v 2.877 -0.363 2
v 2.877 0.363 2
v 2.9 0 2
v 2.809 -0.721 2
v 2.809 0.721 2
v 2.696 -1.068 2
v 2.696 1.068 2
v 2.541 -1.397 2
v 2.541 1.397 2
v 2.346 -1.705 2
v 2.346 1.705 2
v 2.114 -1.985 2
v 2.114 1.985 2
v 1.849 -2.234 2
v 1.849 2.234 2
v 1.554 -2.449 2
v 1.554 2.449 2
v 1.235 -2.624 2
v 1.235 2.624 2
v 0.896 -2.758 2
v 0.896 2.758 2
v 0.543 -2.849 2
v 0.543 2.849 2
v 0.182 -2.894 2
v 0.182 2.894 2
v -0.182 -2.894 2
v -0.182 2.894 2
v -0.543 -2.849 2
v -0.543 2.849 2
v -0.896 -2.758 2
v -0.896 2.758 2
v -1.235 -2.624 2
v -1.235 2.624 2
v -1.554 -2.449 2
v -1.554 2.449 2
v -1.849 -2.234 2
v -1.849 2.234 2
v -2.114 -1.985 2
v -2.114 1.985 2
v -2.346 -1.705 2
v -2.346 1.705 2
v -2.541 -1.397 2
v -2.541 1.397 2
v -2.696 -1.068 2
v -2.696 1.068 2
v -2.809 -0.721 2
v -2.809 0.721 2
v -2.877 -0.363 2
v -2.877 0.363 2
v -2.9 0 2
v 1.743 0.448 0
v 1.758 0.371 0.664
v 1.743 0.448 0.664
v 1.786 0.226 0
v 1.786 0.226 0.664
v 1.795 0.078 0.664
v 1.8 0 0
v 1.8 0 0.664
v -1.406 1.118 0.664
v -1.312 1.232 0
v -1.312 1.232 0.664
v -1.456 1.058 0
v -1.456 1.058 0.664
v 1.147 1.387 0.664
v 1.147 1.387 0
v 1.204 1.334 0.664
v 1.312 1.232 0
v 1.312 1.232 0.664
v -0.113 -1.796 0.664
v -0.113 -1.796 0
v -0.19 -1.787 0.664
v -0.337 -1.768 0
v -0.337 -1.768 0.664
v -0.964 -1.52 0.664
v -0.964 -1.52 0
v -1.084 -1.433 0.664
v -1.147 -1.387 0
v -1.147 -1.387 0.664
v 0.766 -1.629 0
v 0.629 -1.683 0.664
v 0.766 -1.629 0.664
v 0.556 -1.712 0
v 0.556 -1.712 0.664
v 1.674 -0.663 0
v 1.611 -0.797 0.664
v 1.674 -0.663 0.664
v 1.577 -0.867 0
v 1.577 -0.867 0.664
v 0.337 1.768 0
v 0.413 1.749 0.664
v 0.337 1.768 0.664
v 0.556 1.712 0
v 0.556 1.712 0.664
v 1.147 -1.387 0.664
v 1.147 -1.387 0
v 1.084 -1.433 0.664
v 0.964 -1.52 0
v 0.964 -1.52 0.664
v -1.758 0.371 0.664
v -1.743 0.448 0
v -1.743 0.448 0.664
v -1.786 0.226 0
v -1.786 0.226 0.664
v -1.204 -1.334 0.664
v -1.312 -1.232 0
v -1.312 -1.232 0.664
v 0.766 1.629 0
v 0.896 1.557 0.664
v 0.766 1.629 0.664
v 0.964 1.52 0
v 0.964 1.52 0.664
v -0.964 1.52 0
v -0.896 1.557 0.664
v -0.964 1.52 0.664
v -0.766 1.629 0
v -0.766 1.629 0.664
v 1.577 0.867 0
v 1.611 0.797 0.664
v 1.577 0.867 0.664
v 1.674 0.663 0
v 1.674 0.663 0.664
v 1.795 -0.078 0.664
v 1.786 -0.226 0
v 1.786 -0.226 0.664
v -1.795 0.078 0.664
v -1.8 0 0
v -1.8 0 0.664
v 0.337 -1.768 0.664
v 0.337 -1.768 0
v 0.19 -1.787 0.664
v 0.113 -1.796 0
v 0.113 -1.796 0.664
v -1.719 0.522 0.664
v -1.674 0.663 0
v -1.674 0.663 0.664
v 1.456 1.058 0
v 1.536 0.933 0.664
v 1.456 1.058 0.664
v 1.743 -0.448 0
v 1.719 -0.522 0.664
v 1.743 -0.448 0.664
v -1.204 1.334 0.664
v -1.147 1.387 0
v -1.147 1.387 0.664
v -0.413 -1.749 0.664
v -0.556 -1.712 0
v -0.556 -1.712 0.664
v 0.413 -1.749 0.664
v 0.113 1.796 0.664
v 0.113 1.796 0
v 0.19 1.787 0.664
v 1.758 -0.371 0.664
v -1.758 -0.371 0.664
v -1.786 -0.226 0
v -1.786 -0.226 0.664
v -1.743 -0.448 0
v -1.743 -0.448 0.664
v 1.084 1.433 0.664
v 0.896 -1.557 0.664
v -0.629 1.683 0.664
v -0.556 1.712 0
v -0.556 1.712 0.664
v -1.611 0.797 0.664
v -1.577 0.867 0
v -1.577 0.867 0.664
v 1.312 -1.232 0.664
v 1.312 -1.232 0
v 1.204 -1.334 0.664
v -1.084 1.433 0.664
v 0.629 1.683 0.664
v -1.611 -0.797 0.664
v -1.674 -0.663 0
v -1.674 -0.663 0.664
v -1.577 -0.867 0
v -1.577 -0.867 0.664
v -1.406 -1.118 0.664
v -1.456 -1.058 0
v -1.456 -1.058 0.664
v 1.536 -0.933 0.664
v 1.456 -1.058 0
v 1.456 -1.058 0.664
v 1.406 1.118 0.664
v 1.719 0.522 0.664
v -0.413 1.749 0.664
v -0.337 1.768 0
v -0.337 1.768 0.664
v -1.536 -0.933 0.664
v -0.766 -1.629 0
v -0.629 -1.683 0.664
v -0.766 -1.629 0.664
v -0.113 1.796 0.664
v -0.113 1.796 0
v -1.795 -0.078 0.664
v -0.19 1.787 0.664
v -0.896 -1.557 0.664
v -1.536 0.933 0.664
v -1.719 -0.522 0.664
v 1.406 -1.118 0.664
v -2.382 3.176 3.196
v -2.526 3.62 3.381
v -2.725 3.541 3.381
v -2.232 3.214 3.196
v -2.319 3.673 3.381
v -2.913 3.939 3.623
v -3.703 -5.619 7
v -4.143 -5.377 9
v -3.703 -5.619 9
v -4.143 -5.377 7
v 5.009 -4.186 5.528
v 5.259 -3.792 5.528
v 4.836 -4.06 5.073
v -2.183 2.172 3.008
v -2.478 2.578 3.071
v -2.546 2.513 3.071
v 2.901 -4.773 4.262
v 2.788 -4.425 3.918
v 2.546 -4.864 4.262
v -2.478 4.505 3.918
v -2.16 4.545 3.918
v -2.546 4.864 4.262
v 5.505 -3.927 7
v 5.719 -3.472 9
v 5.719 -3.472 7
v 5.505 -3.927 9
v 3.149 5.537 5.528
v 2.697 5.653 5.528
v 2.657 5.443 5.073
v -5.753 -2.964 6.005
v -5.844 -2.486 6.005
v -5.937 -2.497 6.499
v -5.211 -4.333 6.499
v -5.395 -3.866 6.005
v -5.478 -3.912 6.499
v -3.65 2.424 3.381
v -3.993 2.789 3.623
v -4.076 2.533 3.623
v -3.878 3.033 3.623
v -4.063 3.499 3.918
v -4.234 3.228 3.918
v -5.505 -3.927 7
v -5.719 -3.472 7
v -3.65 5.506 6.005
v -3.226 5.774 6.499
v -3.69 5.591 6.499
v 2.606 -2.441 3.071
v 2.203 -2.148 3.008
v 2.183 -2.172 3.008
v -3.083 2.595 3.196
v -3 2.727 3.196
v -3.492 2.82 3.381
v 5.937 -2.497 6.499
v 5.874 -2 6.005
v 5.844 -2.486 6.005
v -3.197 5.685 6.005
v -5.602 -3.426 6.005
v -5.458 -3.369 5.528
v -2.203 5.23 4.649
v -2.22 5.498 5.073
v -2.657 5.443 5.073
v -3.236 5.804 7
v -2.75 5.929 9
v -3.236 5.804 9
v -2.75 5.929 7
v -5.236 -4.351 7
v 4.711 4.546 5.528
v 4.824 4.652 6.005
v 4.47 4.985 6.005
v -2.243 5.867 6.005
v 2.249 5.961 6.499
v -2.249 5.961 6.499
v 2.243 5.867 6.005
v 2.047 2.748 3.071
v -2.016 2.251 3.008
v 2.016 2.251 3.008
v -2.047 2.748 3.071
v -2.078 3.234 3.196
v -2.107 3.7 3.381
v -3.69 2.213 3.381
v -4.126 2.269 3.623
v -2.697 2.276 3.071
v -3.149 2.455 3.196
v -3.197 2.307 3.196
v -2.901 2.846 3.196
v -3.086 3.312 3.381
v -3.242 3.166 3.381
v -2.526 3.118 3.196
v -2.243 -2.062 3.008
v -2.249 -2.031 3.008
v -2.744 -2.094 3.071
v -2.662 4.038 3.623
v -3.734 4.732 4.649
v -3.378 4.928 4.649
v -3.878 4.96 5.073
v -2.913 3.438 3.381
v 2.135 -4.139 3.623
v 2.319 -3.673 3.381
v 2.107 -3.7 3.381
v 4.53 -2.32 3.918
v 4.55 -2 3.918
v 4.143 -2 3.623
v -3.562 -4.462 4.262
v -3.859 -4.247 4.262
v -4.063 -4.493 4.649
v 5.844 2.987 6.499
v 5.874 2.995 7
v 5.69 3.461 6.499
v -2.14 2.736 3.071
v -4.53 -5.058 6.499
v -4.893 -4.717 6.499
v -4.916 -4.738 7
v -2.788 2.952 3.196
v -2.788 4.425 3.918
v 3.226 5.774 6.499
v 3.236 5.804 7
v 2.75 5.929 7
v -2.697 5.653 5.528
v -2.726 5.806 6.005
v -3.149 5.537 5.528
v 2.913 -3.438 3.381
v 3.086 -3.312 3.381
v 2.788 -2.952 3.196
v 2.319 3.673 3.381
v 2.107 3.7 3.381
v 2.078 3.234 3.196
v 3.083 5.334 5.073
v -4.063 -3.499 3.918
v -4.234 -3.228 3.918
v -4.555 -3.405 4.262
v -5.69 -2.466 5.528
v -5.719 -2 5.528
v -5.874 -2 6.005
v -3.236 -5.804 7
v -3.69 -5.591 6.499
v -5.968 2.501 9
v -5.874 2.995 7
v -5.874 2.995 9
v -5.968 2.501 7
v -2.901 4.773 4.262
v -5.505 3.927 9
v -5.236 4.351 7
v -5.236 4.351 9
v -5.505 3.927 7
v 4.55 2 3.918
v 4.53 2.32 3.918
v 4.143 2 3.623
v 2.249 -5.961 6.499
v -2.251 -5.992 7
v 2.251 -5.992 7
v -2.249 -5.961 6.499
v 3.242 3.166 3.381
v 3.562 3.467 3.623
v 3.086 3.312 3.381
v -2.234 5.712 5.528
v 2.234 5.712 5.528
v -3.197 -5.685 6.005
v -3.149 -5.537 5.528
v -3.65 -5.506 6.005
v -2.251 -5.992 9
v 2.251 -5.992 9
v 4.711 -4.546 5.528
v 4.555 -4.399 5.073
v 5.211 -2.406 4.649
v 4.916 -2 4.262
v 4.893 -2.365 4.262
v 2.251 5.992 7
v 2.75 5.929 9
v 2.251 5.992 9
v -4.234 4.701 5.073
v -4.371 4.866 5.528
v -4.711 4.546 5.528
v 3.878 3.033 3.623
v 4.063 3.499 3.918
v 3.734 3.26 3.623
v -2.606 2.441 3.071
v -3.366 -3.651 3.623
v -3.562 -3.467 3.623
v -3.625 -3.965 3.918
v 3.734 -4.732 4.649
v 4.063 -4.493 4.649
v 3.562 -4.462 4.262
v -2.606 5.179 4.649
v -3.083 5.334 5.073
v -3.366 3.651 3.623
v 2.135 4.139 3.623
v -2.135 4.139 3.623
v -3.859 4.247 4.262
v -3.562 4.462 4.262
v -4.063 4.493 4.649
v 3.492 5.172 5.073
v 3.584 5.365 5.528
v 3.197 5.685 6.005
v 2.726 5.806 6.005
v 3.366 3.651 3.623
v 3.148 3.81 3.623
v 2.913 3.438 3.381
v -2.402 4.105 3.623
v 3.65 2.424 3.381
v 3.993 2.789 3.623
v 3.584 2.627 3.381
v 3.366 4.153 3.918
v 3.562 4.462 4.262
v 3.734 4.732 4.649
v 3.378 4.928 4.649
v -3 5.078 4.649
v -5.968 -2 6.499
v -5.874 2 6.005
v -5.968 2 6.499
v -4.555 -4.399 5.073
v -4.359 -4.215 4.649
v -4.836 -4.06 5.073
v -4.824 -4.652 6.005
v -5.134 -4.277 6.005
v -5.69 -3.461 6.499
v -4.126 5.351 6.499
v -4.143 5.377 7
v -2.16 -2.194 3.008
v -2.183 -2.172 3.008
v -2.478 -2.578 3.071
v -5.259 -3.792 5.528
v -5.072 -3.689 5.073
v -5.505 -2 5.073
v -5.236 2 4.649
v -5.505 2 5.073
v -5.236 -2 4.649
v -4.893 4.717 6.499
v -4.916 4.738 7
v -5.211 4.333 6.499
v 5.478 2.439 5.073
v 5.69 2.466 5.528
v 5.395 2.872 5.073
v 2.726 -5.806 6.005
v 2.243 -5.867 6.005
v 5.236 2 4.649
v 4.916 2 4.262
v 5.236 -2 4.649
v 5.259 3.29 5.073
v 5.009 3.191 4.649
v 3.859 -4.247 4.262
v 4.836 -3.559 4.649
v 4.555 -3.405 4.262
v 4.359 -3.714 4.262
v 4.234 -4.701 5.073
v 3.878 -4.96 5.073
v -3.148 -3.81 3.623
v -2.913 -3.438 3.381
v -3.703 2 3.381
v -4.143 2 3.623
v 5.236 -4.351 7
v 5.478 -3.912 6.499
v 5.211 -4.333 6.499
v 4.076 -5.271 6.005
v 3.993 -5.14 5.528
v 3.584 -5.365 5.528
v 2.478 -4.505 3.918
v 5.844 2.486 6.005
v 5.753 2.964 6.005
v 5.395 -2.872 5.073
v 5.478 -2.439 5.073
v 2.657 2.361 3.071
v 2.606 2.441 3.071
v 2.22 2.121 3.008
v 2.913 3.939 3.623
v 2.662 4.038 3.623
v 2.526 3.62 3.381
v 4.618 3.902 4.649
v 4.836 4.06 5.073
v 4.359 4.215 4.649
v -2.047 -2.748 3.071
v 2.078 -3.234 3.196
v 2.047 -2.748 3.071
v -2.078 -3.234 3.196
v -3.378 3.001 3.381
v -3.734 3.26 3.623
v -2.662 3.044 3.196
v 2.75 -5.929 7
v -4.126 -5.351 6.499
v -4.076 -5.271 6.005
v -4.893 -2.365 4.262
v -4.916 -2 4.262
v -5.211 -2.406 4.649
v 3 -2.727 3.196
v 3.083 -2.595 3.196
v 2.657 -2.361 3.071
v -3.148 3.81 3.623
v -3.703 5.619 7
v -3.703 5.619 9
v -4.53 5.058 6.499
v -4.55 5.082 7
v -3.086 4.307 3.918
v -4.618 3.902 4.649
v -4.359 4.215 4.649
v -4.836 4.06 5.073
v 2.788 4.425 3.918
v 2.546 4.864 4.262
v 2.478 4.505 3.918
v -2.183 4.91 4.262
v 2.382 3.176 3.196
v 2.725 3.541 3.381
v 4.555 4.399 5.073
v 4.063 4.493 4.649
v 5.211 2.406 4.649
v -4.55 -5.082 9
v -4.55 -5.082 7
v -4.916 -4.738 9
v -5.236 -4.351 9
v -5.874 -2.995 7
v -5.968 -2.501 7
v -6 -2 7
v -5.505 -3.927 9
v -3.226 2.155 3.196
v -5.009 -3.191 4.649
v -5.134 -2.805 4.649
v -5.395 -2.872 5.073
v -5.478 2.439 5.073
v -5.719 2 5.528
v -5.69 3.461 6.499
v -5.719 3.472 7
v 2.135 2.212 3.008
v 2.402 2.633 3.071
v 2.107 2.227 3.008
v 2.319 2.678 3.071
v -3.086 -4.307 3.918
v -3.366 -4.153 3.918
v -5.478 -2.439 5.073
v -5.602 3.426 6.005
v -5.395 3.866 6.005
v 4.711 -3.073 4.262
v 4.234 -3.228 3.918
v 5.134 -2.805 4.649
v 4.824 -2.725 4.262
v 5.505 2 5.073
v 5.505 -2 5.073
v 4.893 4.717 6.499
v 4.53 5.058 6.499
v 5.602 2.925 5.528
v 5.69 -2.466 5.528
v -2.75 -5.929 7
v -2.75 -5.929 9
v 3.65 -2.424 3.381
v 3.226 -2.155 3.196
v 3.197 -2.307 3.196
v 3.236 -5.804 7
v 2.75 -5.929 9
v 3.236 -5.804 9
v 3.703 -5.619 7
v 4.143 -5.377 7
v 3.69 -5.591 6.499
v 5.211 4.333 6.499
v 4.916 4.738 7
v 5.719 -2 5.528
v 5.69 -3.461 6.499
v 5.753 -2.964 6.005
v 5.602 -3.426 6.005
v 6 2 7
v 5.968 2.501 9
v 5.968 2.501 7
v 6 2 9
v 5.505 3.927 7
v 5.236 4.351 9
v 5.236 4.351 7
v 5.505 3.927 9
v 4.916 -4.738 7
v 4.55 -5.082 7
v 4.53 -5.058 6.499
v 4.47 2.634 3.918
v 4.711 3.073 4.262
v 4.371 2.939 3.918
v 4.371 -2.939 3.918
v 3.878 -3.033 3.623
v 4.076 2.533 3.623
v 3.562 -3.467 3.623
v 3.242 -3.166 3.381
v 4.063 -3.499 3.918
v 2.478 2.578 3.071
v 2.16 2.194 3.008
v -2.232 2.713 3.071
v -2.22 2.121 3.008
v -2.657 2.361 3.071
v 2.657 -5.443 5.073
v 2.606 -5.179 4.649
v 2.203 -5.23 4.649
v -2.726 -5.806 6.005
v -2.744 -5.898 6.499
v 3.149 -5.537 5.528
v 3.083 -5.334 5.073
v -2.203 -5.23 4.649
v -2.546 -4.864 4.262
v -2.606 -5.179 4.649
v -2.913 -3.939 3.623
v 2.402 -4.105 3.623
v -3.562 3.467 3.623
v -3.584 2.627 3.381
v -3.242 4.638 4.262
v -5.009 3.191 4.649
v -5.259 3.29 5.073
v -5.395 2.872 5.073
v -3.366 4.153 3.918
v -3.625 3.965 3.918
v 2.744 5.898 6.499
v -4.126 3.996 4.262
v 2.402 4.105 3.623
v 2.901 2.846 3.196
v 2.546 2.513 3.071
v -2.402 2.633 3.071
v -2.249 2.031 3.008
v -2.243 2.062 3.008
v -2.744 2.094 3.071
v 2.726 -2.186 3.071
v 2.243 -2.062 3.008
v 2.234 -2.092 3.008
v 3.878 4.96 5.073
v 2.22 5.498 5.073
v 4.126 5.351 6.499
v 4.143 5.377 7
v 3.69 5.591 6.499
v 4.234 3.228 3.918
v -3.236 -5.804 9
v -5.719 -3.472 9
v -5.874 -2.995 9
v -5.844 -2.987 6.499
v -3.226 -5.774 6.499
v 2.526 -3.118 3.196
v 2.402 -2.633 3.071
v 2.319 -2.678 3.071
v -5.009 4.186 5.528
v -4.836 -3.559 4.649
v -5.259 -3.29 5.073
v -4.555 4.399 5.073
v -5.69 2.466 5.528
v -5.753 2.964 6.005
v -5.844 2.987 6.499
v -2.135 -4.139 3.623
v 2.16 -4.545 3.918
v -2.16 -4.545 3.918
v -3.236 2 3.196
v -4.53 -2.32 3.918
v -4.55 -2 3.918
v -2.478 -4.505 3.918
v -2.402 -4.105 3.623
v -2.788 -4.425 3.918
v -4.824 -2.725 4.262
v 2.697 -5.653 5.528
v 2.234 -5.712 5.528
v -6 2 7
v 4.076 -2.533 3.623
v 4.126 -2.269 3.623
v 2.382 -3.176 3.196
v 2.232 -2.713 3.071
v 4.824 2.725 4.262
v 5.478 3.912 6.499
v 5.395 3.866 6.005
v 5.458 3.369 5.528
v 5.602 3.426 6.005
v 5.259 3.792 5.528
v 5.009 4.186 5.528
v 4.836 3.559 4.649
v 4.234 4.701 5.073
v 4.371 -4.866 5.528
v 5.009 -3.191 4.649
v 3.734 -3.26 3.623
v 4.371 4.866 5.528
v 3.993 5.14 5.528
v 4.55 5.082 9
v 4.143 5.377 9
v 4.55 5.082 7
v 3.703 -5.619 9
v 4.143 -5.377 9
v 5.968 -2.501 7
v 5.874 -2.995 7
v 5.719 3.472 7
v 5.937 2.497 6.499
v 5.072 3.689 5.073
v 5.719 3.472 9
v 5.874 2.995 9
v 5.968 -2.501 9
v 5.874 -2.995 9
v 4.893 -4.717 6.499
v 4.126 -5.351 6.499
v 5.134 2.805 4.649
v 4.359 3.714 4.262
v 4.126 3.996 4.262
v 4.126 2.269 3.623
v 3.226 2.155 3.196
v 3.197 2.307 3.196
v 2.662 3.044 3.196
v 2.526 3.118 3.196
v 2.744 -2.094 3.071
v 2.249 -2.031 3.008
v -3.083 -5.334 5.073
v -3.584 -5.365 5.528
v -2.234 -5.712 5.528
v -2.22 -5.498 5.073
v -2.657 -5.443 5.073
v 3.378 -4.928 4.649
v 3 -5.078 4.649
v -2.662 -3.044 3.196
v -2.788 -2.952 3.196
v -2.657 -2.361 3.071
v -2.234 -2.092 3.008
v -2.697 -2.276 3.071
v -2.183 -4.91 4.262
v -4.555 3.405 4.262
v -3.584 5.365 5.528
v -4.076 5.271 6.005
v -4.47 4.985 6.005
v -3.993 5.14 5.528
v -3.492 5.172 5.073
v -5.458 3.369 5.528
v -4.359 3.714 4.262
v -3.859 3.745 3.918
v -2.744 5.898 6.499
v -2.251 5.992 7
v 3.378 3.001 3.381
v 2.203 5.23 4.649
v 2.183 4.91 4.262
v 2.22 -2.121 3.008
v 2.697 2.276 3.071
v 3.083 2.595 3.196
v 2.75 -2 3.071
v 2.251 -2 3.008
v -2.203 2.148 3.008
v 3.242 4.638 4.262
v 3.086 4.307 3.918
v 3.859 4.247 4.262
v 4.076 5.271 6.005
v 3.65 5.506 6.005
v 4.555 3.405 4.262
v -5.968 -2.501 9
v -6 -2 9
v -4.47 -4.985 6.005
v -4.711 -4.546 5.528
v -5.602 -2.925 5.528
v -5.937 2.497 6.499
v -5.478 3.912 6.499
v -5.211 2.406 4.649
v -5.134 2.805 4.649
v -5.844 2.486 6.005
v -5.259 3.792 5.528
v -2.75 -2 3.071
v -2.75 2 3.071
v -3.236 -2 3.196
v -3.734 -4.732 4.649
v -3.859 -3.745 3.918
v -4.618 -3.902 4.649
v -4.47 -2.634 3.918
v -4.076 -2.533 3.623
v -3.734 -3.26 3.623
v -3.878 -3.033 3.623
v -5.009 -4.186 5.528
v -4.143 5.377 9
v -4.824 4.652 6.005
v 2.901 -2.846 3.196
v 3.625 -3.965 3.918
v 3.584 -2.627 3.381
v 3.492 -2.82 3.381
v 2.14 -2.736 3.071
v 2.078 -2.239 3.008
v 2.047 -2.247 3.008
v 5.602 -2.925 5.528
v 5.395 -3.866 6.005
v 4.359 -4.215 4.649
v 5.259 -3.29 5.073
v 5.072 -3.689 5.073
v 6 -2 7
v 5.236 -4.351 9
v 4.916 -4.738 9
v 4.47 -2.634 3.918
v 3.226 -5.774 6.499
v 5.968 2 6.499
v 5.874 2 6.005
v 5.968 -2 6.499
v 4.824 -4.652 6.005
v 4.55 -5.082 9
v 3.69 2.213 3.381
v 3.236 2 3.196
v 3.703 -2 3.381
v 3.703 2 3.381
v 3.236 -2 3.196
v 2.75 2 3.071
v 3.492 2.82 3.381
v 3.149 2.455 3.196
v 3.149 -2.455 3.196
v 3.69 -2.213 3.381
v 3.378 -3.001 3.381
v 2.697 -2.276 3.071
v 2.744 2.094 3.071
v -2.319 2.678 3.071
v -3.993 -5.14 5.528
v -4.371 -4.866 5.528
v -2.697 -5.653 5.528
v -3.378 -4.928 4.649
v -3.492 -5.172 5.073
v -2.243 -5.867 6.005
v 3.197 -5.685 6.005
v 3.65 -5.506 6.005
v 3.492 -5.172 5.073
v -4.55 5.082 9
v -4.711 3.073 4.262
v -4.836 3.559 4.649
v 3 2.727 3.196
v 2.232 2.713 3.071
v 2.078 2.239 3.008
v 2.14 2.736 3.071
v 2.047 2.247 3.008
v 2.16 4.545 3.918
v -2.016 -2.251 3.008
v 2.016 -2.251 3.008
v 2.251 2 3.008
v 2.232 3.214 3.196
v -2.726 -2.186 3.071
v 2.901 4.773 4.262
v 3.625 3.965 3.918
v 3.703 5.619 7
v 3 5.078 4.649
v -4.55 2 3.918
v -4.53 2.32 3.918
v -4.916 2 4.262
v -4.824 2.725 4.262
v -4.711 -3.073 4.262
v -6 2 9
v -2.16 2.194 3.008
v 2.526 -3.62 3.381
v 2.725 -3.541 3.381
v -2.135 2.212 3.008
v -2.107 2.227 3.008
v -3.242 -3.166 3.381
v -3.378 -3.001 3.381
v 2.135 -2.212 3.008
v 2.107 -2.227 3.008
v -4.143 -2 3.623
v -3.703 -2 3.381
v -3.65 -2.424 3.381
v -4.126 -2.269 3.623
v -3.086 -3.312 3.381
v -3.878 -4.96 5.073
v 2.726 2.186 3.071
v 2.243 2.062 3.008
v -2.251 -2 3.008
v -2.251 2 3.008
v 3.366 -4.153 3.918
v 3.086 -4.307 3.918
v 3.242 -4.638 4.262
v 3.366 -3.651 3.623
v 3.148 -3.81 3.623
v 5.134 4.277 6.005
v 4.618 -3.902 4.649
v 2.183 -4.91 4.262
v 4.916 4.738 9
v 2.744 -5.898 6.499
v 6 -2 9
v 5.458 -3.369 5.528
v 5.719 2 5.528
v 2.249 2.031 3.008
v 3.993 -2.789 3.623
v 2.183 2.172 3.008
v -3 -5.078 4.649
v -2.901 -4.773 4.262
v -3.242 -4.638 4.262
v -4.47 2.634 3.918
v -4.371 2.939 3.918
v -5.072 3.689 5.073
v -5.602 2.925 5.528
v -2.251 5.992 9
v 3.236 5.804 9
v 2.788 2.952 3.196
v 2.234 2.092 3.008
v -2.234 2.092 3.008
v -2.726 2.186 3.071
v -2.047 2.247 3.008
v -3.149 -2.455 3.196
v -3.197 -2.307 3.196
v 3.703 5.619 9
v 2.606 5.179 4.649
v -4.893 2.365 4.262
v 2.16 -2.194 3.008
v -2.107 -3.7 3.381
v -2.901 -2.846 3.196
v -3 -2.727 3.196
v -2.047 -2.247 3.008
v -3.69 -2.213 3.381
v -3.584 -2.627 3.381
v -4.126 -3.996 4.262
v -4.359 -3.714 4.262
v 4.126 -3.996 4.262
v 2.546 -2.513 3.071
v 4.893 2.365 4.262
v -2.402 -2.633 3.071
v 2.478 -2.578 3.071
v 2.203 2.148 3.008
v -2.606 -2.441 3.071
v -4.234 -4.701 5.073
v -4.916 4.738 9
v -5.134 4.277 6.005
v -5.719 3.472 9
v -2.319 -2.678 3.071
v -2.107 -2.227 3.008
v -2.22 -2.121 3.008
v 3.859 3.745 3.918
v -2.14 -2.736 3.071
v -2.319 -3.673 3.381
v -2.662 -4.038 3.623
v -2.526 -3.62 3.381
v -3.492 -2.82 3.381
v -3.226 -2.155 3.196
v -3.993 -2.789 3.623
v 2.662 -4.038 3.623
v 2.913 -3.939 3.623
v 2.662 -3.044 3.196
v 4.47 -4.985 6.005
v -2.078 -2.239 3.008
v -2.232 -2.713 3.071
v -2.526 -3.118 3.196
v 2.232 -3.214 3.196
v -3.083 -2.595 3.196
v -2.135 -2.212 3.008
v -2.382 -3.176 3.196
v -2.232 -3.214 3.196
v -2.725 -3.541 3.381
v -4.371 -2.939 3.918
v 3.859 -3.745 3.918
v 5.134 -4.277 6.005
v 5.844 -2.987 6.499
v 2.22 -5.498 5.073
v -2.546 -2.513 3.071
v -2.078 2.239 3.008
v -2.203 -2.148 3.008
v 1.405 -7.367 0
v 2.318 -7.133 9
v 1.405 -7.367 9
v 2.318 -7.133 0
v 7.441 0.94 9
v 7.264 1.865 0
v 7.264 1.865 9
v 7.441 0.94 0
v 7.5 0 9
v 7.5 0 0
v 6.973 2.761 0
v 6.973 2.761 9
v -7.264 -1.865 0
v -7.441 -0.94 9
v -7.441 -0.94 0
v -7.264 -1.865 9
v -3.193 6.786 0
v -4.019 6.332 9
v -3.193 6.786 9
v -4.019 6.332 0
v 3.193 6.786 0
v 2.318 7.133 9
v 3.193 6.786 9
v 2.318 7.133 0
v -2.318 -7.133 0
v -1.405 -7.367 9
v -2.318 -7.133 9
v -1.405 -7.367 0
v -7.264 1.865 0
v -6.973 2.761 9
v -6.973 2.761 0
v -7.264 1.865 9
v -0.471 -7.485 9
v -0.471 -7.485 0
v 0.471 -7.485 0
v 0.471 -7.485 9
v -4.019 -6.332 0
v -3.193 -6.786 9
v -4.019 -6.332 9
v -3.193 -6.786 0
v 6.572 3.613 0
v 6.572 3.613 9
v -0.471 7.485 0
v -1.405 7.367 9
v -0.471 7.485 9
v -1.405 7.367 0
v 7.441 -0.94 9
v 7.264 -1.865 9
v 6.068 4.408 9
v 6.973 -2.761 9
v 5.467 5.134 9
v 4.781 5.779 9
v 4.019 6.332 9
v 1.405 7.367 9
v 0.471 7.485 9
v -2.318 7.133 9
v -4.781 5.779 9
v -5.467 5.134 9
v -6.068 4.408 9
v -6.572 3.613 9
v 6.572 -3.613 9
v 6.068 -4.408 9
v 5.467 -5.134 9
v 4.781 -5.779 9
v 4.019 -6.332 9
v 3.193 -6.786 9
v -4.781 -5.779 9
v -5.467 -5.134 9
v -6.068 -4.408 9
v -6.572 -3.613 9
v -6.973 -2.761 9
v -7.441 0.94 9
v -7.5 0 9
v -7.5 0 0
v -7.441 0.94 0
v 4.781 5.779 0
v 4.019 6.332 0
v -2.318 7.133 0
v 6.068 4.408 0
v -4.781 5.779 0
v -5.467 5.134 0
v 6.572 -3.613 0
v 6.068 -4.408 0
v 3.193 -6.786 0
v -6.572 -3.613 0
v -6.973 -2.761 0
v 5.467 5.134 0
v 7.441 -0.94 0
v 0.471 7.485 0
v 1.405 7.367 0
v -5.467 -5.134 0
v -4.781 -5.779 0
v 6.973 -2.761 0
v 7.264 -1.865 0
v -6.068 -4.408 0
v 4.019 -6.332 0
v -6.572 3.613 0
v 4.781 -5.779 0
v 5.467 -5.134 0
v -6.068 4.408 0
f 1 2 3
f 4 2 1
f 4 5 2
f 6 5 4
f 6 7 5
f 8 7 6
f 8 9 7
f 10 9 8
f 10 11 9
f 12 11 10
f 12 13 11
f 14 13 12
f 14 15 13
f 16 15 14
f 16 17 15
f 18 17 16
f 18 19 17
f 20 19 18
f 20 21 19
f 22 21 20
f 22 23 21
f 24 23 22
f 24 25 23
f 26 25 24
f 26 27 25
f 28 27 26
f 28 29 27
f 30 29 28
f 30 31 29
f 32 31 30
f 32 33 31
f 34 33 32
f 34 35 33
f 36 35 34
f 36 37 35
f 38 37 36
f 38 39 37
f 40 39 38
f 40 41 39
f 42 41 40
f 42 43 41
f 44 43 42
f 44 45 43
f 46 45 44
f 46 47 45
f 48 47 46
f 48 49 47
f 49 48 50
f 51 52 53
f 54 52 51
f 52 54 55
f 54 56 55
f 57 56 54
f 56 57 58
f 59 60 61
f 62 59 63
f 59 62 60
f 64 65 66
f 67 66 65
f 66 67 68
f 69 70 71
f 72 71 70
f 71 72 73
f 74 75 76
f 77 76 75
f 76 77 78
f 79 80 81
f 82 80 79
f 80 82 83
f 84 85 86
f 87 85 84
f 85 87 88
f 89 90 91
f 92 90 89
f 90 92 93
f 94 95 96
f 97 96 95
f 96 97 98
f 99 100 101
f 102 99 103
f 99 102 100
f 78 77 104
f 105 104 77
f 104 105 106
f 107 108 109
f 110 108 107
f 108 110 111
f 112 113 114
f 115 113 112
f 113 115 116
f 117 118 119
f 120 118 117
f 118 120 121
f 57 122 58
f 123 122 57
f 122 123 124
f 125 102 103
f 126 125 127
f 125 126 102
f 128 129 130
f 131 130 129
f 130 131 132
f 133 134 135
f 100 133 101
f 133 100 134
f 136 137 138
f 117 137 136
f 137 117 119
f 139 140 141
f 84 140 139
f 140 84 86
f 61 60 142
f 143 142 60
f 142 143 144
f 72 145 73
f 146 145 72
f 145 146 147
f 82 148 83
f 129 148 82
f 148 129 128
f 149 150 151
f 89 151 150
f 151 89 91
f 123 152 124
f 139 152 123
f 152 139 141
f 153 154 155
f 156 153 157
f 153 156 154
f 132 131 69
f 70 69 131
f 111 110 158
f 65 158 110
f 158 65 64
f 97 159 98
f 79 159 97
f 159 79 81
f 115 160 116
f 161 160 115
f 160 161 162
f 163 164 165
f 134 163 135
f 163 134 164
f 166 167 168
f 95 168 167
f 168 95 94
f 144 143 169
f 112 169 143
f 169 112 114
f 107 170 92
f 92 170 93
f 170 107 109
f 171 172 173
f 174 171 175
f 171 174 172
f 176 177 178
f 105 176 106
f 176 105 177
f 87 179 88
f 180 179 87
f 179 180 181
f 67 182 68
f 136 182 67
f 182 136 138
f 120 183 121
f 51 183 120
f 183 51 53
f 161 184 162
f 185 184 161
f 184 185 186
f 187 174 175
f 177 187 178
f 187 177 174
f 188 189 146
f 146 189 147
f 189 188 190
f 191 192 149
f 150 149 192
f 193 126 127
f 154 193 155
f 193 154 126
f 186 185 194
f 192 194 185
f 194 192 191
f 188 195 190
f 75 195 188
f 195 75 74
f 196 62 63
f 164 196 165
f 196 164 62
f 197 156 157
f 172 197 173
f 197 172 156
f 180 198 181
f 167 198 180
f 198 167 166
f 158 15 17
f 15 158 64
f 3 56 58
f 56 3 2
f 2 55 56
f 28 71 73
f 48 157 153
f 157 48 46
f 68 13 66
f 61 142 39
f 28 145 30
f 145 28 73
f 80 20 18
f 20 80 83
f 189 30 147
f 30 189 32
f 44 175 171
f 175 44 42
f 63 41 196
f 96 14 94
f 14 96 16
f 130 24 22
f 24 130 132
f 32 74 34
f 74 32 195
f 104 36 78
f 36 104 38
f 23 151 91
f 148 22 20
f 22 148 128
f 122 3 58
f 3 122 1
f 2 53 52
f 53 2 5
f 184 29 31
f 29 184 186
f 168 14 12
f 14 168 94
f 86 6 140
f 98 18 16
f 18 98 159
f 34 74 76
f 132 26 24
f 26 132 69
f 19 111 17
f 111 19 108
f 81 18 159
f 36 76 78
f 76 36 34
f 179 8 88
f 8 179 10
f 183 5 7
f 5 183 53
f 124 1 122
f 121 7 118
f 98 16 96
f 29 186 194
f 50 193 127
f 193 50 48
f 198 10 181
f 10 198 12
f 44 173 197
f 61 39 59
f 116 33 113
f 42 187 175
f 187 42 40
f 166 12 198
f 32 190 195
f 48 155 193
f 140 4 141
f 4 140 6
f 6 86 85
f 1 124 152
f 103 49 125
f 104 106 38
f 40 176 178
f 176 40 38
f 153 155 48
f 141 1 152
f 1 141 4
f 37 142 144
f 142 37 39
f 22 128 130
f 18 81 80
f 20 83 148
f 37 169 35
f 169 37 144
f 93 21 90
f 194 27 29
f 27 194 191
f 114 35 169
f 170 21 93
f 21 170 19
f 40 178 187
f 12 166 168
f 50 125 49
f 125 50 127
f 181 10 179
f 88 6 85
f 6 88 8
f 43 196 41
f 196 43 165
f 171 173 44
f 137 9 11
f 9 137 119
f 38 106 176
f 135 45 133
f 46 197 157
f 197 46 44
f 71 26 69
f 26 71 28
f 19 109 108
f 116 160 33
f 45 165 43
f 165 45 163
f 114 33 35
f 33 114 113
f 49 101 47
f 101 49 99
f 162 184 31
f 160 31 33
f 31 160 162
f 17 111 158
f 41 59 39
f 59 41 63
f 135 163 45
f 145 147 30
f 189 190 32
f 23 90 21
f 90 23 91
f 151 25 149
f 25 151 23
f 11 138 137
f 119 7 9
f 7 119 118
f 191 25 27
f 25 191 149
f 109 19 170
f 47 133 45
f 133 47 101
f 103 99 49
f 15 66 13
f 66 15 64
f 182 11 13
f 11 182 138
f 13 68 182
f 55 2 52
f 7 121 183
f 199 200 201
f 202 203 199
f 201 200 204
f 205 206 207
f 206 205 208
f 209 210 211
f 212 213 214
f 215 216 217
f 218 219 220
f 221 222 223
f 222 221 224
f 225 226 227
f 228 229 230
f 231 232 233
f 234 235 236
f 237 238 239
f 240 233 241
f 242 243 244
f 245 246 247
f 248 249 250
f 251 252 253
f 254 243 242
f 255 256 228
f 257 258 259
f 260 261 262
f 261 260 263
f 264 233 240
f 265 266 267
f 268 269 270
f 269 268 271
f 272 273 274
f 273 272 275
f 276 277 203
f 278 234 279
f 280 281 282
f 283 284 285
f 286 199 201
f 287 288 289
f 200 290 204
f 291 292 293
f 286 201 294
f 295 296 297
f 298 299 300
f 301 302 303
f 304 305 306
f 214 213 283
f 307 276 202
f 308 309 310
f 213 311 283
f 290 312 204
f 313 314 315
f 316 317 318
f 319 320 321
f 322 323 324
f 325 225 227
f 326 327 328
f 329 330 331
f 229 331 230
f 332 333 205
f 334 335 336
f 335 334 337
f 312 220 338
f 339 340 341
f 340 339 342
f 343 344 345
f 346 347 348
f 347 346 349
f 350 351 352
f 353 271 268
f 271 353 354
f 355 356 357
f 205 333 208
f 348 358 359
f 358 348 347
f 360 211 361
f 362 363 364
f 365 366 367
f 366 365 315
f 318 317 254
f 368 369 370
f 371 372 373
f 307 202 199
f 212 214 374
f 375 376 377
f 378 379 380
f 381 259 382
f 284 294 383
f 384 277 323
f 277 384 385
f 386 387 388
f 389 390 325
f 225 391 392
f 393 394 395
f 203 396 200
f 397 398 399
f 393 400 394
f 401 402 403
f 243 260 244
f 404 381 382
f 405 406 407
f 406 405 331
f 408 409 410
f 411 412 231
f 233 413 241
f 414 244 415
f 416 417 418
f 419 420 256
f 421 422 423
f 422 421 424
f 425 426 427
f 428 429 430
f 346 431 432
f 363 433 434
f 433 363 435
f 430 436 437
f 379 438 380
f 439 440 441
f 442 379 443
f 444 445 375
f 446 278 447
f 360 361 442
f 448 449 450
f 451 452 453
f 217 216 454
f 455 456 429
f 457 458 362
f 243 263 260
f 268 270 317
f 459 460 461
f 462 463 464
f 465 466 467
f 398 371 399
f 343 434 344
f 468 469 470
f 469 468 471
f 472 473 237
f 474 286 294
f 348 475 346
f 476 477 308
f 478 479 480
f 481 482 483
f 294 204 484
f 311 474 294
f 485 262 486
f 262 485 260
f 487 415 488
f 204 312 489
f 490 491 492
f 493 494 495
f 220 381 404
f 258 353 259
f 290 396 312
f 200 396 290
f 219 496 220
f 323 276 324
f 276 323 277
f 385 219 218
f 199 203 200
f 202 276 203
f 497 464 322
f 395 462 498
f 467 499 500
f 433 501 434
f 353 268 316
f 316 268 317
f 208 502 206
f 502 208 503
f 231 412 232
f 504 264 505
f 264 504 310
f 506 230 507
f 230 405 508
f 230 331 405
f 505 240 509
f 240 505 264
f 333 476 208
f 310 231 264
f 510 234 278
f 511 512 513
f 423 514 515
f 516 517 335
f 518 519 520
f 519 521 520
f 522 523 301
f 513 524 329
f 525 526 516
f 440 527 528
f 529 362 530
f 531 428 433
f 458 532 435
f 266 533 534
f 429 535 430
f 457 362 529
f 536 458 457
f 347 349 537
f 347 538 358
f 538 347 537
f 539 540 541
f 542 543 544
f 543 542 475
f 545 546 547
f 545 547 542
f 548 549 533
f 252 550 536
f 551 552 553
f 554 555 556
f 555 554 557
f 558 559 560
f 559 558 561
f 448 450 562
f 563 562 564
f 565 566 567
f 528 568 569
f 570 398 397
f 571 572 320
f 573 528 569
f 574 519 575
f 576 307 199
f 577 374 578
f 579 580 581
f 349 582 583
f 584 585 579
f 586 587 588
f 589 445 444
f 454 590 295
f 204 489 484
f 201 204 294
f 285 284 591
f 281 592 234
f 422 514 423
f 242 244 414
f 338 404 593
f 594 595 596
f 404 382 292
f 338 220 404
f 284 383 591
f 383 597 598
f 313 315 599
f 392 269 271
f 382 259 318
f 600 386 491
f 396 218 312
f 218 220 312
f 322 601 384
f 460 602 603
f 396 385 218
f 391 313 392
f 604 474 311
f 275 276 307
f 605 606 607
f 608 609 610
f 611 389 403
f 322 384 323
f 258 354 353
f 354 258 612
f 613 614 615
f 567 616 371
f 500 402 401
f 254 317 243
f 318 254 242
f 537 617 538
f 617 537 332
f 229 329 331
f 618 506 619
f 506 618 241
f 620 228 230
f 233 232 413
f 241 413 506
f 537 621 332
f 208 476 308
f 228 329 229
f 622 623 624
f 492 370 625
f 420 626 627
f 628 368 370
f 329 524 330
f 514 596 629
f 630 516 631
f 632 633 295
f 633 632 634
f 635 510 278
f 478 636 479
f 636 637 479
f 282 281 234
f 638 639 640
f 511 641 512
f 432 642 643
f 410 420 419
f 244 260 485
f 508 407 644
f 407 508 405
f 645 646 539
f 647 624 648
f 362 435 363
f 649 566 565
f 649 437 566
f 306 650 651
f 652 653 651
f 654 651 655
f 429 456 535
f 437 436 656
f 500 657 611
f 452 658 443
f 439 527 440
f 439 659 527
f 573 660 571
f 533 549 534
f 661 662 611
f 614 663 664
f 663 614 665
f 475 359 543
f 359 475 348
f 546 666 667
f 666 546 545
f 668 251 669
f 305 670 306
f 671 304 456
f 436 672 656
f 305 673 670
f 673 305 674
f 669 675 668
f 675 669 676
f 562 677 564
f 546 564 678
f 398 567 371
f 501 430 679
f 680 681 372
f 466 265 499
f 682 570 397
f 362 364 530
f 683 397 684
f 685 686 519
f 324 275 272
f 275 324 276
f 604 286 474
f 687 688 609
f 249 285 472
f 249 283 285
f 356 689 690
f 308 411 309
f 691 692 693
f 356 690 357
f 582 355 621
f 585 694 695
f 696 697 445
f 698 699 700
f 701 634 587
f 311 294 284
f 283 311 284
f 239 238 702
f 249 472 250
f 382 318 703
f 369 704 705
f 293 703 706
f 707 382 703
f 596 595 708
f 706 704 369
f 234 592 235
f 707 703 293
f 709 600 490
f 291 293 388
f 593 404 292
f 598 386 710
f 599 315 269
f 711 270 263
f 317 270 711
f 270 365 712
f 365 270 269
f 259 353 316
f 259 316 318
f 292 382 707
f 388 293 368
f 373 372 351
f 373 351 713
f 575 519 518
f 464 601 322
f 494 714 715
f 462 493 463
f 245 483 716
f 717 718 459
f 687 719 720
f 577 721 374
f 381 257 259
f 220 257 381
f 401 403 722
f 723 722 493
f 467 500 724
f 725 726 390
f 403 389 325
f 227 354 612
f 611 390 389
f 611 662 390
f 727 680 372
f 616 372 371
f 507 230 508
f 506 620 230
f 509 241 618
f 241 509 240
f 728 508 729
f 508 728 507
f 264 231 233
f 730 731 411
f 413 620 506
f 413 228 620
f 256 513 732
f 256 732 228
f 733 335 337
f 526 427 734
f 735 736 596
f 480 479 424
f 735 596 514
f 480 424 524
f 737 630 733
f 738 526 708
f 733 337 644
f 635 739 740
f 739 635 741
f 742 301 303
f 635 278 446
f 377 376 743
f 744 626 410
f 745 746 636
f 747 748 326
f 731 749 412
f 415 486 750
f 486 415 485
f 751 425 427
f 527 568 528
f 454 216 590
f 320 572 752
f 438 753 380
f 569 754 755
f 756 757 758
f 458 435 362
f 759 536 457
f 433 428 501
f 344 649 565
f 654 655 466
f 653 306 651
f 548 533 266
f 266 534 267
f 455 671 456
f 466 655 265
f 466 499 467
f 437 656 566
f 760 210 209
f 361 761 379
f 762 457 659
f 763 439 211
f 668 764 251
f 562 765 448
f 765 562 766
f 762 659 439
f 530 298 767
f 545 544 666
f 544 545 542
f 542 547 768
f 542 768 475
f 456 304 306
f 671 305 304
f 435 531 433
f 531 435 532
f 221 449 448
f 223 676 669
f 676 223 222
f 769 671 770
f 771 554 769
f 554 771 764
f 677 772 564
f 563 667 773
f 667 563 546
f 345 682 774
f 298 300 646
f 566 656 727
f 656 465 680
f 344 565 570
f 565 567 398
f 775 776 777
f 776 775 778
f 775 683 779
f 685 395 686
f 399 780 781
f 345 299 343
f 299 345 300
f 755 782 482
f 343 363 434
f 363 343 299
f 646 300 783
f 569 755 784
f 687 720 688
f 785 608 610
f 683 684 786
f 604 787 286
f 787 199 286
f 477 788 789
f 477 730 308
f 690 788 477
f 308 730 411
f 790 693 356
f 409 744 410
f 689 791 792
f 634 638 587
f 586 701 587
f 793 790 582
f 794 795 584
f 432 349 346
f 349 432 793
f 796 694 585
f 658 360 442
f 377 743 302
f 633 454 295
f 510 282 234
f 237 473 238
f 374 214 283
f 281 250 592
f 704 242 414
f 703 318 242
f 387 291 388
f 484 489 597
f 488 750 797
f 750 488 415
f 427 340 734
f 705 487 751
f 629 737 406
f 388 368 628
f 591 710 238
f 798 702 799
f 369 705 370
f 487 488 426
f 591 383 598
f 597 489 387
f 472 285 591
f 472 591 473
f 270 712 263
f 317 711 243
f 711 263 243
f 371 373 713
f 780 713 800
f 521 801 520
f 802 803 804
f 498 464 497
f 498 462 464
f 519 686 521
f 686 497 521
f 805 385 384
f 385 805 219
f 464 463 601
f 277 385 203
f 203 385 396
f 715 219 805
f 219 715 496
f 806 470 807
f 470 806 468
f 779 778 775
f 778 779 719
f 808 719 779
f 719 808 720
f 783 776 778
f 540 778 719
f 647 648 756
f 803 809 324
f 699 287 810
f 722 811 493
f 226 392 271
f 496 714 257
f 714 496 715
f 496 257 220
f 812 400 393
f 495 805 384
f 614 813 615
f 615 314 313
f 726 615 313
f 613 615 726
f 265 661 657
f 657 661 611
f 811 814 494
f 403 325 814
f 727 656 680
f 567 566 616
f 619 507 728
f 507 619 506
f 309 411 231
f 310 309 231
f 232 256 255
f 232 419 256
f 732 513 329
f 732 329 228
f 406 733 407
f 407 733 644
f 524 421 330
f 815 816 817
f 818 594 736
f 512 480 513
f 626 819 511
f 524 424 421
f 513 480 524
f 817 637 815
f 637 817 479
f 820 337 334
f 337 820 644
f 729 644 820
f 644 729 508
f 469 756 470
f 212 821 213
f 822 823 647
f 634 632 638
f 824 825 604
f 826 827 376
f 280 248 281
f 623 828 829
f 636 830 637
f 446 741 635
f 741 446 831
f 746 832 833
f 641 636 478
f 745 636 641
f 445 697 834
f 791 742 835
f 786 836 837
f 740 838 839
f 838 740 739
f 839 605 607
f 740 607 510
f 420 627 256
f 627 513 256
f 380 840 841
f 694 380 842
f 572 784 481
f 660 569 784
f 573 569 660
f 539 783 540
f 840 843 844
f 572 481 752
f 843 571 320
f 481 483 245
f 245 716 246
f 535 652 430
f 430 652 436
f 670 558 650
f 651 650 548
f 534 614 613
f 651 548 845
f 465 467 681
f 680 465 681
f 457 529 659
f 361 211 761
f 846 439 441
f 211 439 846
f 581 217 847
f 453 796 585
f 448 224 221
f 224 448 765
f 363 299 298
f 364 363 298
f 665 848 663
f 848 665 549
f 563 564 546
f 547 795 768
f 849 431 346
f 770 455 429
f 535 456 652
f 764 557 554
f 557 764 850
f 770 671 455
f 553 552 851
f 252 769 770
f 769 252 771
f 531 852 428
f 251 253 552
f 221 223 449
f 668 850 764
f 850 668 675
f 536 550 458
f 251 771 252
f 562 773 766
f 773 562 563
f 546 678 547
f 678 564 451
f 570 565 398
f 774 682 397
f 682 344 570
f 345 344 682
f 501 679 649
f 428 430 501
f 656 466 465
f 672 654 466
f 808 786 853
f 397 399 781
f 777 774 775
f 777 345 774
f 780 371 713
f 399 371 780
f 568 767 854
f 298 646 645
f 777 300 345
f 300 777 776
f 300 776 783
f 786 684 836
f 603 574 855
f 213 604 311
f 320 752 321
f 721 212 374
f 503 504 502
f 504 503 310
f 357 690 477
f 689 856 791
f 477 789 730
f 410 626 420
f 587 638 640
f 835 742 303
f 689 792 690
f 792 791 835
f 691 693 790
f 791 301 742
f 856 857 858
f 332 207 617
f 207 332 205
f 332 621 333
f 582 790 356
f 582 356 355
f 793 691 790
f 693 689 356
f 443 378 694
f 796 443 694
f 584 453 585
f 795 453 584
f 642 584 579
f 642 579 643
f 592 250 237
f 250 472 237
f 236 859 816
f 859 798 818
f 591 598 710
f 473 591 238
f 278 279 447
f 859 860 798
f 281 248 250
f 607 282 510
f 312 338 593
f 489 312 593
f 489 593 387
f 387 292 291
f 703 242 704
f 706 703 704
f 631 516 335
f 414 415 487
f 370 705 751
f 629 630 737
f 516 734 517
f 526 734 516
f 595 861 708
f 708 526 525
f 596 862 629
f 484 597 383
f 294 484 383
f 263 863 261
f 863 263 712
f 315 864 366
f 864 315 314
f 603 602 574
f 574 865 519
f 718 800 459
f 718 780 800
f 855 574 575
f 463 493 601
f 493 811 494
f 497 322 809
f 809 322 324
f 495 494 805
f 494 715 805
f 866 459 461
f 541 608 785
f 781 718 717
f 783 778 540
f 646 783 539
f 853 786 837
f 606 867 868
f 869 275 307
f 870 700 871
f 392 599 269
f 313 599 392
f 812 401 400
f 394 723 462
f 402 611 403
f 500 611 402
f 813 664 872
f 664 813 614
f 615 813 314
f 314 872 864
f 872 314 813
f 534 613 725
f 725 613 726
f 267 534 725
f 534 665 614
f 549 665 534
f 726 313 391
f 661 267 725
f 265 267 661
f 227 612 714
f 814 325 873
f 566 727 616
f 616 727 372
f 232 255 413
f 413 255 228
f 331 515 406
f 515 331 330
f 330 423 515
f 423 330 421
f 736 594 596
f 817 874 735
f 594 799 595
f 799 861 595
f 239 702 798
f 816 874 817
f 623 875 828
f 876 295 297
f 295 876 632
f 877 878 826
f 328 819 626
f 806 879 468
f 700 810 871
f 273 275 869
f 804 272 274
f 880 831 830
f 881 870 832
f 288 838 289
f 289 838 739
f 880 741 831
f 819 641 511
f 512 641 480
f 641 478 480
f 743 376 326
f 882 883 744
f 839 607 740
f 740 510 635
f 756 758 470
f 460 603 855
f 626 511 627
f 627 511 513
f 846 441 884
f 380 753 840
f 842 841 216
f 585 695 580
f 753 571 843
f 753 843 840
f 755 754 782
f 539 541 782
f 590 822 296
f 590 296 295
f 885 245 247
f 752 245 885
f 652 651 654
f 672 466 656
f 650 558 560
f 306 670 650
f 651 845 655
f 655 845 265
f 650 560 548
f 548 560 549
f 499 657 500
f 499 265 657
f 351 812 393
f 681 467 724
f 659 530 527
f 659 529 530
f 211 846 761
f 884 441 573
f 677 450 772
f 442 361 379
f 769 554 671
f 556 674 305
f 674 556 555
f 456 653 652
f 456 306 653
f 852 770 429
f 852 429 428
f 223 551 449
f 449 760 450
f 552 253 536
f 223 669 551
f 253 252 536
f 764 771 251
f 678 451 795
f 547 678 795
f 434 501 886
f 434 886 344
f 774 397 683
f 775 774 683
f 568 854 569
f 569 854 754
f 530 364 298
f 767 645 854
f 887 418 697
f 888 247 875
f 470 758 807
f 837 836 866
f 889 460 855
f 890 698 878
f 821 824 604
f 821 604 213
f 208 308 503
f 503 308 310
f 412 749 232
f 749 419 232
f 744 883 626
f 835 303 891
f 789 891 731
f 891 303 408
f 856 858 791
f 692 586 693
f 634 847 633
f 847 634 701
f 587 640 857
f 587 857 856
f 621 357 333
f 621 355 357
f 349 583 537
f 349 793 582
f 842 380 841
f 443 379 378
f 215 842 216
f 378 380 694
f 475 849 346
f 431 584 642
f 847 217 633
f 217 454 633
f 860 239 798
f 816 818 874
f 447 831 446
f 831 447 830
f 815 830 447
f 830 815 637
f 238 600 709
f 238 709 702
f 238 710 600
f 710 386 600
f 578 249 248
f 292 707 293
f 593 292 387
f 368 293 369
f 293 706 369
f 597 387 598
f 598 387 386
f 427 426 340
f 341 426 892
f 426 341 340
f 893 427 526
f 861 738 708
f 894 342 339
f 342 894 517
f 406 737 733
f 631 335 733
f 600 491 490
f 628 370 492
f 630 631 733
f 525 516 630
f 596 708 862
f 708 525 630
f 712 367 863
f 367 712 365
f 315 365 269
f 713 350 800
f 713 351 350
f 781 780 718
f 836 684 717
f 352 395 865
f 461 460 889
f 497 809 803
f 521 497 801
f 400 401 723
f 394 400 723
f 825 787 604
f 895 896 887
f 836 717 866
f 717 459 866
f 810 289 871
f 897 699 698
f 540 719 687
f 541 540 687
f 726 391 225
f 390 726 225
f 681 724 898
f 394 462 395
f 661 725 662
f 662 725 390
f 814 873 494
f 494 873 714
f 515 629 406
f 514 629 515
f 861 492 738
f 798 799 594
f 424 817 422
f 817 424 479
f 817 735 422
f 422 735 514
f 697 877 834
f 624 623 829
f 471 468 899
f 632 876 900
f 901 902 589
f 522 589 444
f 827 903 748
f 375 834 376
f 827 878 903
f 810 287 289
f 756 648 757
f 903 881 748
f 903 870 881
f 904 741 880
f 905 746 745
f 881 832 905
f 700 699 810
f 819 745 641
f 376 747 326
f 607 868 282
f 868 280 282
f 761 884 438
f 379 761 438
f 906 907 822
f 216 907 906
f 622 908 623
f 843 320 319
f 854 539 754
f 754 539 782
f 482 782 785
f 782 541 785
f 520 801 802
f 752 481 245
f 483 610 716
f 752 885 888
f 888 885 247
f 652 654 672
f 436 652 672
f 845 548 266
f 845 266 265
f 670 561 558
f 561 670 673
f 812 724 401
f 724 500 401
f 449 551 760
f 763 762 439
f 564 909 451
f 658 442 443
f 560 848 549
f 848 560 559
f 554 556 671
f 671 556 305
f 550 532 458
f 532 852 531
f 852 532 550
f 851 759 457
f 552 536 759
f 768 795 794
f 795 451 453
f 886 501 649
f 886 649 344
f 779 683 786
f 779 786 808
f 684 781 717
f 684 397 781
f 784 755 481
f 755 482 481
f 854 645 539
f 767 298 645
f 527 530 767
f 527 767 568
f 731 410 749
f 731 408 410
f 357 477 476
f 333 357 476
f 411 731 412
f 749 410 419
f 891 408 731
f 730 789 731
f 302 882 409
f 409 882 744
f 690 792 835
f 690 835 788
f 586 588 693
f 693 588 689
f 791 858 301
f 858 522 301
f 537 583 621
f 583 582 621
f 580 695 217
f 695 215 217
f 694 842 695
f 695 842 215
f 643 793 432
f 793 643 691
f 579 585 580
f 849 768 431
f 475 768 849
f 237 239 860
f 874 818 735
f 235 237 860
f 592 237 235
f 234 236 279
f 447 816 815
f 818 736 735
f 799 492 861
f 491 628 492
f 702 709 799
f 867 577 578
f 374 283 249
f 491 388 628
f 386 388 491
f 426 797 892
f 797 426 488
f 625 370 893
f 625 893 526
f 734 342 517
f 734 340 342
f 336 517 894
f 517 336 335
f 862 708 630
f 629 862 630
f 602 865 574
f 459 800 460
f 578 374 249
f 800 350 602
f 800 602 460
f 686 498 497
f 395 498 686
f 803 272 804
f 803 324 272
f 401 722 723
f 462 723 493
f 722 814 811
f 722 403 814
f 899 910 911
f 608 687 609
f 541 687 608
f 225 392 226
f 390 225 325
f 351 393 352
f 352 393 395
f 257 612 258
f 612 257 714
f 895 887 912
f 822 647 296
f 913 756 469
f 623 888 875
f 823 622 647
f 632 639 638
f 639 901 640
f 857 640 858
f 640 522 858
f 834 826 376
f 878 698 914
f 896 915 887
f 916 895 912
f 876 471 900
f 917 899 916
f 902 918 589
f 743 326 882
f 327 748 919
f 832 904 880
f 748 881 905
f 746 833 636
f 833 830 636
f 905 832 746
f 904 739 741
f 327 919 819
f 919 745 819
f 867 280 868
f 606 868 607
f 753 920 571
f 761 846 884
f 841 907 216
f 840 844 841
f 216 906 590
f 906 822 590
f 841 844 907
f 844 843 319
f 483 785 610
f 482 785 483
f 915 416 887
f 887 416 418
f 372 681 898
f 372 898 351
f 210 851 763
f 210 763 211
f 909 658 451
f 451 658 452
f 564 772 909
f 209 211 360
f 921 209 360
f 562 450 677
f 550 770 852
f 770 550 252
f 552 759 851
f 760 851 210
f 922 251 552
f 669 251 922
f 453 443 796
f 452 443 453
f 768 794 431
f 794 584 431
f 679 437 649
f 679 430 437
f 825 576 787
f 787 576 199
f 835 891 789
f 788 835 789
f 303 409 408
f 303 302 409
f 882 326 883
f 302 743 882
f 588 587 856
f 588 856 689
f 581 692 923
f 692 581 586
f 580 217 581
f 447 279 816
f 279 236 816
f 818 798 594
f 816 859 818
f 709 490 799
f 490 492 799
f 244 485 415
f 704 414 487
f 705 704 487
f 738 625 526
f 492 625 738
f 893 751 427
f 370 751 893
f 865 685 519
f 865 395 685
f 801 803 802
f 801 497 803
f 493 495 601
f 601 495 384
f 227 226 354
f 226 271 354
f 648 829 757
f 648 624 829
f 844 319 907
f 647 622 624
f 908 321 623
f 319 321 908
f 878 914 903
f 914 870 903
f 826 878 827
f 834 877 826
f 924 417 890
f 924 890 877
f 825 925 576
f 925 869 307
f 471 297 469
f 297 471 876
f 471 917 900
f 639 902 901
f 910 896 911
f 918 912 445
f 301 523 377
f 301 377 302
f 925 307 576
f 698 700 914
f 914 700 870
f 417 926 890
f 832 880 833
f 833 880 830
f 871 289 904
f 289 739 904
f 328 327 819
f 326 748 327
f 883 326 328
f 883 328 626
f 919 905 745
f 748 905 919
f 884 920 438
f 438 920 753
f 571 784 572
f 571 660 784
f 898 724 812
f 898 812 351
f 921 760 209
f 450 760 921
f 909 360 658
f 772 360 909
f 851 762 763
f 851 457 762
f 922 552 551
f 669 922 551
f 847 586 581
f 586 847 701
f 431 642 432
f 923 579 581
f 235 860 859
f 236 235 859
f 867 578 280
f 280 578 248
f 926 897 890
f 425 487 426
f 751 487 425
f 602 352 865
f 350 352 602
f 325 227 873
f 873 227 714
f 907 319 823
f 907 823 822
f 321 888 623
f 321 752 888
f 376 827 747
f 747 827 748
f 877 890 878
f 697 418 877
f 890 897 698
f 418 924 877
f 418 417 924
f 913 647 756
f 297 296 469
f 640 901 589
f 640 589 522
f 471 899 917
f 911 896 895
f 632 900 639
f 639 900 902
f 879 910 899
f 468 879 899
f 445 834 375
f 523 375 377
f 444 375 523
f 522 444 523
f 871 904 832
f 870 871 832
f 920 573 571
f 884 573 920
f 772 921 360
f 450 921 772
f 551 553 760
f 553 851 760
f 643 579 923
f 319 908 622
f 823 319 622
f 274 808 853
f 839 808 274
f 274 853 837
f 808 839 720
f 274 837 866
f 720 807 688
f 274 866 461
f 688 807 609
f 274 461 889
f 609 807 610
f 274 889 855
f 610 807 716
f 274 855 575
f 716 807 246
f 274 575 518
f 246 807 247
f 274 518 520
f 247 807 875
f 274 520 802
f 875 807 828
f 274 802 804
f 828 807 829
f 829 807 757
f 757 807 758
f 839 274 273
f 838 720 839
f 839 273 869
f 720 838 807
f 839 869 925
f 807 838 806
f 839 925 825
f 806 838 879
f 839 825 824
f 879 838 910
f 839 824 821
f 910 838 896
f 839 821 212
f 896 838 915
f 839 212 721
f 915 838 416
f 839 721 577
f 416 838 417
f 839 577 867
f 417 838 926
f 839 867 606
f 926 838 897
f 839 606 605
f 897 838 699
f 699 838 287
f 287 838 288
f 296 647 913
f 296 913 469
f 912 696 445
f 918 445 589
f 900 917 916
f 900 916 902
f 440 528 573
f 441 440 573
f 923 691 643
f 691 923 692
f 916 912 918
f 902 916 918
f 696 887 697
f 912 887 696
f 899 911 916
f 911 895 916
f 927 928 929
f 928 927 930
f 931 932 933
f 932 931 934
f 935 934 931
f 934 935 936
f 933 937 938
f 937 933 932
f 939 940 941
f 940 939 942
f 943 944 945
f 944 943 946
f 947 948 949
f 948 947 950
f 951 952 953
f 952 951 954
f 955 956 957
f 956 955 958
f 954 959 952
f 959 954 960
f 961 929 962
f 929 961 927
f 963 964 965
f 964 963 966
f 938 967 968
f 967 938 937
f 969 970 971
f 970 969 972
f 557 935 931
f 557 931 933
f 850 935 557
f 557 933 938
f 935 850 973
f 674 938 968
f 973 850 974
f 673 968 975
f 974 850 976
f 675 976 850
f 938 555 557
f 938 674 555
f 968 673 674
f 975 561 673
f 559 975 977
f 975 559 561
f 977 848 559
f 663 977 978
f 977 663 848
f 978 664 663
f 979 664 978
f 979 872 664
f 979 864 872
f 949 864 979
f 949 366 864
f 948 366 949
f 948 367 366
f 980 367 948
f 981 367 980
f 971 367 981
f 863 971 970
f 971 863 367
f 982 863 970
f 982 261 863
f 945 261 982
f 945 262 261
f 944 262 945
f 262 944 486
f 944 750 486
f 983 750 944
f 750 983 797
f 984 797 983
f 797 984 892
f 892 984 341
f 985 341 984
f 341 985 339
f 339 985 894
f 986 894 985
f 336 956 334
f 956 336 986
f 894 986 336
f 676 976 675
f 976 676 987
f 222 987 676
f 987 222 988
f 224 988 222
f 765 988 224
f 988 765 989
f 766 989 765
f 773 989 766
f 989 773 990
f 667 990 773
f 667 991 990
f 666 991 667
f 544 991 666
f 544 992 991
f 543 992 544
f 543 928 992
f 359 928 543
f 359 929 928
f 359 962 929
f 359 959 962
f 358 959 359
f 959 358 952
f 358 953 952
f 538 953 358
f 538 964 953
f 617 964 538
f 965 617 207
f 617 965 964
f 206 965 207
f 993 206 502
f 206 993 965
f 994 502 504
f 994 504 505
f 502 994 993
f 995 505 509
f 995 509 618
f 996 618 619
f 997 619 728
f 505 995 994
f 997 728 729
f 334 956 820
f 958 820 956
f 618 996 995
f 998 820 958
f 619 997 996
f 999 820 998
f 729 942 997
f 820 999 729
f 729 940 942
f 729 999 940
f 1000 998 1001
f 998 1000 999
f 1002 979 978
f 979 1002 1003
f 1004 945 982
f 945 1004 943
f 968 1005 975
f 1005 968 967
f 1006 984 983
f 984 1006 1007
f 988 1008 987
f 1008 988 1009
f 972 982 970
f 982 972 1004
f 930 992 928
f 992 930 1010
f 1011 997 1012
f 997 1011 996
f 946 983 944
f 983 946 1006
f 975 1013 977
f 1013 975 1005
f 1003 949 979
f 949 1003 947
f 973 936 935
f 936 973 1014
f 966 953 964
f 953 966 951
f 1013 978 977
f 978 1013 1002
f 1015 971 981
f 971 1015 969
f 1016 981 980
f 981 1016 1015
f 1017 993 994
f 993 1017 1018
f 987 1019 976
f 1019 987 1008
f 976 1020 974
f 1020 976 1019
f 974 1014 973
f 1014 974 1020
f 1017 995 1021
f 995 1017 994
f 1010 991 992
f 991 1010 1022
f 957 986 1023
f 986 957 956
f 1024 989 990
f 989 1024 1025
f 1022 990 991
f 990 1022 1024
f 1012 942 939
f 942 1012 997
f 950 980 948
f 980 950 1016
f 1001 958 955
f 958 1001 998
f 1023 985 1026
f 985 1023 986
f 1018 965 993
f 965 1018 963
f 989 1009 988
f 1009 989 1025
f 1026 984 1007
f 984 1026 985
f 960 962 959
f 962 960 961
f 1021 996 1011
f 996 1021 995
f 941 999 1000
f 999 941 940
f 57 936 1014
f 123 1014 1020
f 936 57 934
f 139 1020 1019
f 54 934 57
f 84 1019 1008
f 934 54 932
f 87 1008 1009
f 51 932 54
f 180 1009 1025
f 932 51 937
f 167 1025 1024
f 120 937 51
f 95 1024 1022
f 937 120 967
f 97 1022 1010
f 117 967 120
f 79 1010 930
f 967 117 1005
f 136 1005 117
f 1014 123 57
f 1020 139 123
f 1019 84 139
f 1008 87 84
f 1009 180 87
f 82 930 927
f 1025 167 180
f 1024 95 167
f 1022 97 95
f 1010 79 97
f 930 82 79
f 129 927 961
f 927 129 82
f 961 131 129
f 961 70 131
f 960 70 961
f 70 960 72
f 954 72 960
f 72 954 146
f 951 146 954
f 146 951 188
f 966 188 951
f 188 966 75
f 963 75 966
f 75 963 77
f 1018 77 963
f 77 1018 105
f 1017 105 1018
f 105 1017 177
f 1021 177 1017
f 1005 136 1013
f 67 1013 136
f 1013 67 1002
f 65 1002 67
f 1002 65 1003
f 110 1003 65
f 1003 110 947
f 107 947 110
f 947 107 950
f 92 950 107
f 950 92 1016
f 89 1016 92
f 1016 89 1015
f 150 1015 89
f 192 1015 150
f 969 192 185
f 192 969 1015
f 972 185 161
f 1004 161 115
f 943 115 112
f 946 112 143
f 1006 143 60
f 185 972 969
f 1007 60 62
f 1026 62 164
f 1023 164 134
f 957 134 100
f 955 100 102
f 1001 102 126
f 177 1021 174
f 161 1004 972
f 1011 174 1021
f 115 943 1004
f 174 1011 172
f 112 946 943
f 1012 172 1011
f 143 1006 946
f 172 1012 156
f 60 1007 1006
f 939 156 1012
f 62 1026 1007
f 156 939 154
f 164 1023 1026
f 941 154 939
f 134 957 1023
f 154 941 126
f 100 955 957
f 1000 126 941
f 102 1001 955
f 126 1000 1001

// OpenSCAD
$fn = 50;


difference() {
	union() {
		cylinder(h = 9, r = 7.5000000000);
	}
	union() {
		translate(v = [0.0000000000, 0.0000000000, 2]) {
			rotate(a = [0, 0, 0]) {
				difference() {
					union() {
						translate(v = [0, 0, -6.0000000000]) {
							cylinder(h = 6, r = 1.5000000000);
						}
						translate(v = [0, 0, -6.0000000000]) {
							cylinder(h = 6, r = 1.8000000000);
						}
						translate(v = [0, 0, -1.7000000000]) {
							cylinder(h = 1.7000000000, r1 = 1.5000000000, r2 = 2.9000000000);
						}
						translate(v = [0, 0, -6.0000000000]) {
							cylinder(h = 6, r = 1.5000000000);
						}
					}
					union();
				}
			}
		}
		translate(v = [0.0000000000, 0.0000000000, 2]) {
			rotate(a = [0, 0, 0]) {
				difference() {
					union() {
						translate(v = [0, 0, -6.0000000000]) {
							cylinder(h = 6, r = 1.5000000000);
						}
						translate(v = [0, 0, -6.0000000000]) {
							cylinder(h = 6, r = 1.8000000000);
						}
						translate(v = [0, 0, -1.7000000000]) {
							cylinder(h = 1.7000000000, r1 = 1.5000000000, r2 = 2.9000000000);
						}
						translate(v = [0, 0, -6.0000000000]) {
							cylinder(h = 6, r = 1.5000000000);
						}
					}
					union();
				}
			}
		}
		translate(v = [0.0000000000, 0.0000000000, 2]) {
			rotate(a = [0, 0, 0]) {
				difference() {
					union() {
						translate(v = [0, 0, -6.0000000000]) {
							cylinder(h = 6, r = 1.5000000000);
						}
						translate(v = [0, 0, -6.0000000000]) {
							cylinder(h = 6, r = 1.8000000000);
						}
						translate(v = [0, 0, -1.7000000000]) {
							cylinder(h = 1.7000000000, r1 = 1.5000000000, r2 = 2.9000000000);
						}
						translate(v = [0, 0, -6.0000000000]) {
							cylinder(h = 6, r = 1.5000000000);
						}
					}
					union();
				}
			}
		}
		translate(v = [0.0000000000, 0.0000000000, 2]) {
			rotate(a = [0, 0, 0]) {
				difference() {
					union() {
						translate(v = [0, 0, -6.0000000000]) {
							cylinder(h = 6, r = 1.5000000000);
						}
						translate(v = [0, 0, -6.0000000000]) {
							cylinder(h = 6, r = 1.8000000000);
						}
						translate(v = [0, 0, -1.7000000000]) {
							cylinder(h = 1.7000000000, r1 = 1.5000000000, r2 = 2.9000000000);
						}
						translate(v = [0, 0, -6.0000000000]) {
							cylinder(h = 6, r = 1.5000000000);
						}
					}
					union();
				}
			}
		}
		translate(v = [0, 0, 3]) {
			hull() {
				union() {
					translate(v = [-2.0000000000, 2.0000000000, 4]) {
						cylinder(h = 21, r = 4);
					}
					translate(v = [-2.0000000000, 2.0000000000, 4]) {
						sphere(r = 4);
					}
					translate(v = [-2.0000000000, 2.0000000000, 25]) {
						sphere(r = 4);
					}
				}
				union() {
					translate(v = [2.0000000000, 2.0000000000, 4]) {
						cylinder(h = 21, r = 4);
					}
					translate(v = [2.0000000000, 2.0000000000, 4]) {
						sphere(r = 4);
					}
					translate(v = [2.0000000000, 2.0000000000, 25]) {
						sphere(r = 4);
					}
				}
				union() {
					translate(v = [-2.0000000000, -2.0000000000, 4]) {
						cylinder(h = 21, r = 4);
					}
					translate(v = [-2.0000000000, -2.0000000000, 4]) {
						sphere(r = 4);
					}
					translate(v = [-2.0000000000, -2.0000000000, 25]) {
						sphere(r = 4);
					}
				}
				union() {
					translate(v = [2.0000000000, -2.0000000000, 4]) {
						cylinder(h = 21, r = 4);
					}
					translate(v = [2.0000000000, -2.0000000000, 4]) {
						sphere(r = 4);
					}
					translate(v = [2.0000000000, -2.0000000000, 25]) {
						sphere(r = 4);
					}
				}
			}
		}
	}
}
